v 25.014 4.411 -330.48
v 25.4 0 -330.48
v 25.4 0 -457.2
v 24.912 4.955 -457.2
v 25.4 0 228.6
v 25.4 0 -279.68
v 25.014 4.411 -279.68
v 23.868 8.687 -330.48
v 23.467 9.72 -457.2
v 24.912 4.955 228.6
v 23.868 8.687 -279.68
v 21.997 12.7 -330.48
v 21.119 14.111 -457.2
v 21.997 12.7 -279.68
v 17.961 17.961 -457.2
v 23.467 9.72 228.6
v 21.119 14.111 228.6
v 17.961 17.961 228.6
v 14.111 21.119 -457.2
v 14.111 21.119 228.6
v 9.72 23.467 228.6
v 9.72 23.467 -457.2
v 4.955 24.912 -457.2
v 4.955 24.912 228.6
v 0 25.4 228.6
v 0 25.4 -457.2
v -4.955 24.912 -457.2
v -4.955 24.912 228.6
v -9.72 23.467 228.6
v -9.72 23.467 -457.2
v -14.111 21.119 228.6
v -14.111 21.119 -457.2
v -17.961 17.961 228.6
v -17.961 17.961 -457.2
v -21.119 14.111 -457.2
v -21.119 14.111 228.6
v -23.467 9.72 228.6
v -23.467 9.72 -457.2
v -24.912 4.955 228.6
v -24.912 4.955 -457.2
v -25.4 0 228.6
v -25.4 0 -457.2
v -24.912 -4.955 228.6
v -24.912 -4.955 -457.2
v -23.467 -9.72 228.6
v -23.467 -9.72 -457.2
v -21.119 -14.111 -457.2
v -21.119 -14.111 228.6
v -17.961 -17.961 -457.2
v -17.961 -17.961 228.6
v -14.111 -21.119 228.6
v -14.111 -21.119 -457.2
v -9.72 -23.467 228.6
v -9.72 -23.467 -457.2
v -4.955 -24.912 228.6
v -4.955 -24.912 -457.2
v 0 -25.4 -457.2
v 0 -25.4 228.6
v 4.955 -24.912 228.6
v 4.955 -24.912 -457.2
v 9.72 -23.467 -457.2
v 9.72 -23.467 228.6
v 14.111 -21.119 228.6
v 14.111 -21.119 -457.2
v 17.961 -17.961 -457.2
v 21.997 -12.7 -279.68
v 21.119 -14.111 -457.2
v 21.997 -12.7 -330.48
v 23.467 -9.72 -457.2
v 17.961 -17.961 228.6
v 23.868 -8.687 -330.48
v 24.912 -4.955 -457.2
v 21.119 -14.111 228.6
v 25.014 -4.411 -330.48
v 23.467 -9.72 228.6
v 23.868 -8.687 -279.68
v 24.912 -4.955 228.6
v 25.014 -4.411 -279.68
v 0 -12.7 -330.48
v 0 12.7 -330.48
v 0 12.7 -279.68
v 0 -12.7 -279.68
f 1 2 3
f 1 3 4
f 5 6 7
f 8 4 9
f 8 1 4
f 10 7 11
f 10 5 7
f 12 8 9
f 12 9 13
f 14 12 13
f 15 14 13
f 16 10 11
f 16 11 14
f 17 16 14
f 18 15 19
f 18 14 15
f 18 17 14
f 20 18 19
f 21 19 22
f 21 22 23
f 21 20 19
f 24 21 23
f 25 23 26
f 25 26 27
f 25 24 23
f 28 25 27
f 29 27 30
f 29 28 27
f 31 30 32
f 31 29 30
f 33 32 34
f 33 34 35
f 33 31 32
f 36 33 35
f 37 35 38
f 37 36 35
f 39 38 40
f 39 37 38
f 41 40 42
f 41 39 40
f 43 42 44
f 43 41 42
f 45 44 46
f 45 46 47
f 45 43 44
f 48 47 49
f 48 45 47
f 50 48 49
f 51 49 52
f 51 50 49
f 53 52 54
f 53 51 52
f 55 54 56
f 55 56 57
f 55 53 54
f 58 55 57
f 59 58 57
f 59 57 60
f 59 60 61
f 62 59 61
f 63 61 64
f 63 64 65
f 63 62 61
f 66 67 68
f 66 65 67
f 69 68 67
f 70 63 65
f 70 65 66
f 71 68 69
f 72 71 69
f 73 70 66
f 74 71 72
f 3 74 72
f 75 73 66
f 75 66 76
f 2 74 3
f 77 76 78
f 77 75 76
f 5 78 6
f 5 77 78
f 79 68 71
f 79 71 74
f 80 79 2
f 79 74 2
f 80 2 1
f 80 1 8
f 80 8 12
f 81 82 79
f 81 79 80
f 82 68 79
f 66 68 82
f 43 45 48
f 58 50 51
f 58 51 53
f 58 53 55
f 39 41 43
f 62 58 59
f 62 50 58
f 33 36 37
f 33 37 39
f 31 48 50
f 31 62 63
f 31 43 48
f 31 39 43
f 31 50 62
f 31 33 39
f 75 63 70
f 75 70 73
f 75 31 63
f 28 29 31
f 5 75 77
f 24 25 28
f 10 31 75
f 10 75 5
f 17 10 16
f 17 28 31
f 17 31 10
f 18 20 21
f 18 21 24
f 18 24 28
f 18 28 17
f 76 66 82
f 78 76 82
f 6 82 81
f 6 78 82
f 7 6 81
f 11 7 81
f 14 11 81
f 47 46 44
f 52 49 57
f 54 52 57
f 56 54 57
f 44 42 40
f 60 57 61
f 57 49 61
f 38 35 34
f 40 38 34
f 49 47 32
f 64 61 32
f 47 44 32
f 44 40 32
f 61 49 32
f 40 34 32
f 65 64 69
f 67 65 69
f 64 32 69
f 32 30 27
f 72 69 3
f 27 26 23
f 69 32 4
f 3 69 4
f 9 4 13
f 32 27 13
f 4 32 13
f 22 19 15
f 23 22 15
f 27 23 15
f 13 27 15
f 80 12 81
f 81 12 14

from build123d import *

# Parameters (mm, degrees)
F0_R     = 25.4
F1_DEPTH = 228.6
F2_DEPTH = 457.2
F5_W     = 25.4
F5_H     = 50.8
F6_DEPTH = 25.4


with BuildPart() as f1:
    # F0 (on Top) → F1 (new body)
    with BuildSketch(Plane.XY):
        Circle(F0_R)
    extrude(amount=F1_DEPTH)

    # F0 (on Top) → F2 (join)
    with BuildSketch(Plane.XY):
        Circle(F0_R)
    extrude(amount=-F2_DEPTH)

    # F5 (on face) → F6 (cut)
    with BuildSketch(Plane.YZ.offset(25.4)):
        with Locations((0, -305.080473)):
            Rectangle(F5_W, F5_H)
    extrude(amount=-F6_DEPTH, mode=Mode.SUBTRACT)


solid = f1.part
